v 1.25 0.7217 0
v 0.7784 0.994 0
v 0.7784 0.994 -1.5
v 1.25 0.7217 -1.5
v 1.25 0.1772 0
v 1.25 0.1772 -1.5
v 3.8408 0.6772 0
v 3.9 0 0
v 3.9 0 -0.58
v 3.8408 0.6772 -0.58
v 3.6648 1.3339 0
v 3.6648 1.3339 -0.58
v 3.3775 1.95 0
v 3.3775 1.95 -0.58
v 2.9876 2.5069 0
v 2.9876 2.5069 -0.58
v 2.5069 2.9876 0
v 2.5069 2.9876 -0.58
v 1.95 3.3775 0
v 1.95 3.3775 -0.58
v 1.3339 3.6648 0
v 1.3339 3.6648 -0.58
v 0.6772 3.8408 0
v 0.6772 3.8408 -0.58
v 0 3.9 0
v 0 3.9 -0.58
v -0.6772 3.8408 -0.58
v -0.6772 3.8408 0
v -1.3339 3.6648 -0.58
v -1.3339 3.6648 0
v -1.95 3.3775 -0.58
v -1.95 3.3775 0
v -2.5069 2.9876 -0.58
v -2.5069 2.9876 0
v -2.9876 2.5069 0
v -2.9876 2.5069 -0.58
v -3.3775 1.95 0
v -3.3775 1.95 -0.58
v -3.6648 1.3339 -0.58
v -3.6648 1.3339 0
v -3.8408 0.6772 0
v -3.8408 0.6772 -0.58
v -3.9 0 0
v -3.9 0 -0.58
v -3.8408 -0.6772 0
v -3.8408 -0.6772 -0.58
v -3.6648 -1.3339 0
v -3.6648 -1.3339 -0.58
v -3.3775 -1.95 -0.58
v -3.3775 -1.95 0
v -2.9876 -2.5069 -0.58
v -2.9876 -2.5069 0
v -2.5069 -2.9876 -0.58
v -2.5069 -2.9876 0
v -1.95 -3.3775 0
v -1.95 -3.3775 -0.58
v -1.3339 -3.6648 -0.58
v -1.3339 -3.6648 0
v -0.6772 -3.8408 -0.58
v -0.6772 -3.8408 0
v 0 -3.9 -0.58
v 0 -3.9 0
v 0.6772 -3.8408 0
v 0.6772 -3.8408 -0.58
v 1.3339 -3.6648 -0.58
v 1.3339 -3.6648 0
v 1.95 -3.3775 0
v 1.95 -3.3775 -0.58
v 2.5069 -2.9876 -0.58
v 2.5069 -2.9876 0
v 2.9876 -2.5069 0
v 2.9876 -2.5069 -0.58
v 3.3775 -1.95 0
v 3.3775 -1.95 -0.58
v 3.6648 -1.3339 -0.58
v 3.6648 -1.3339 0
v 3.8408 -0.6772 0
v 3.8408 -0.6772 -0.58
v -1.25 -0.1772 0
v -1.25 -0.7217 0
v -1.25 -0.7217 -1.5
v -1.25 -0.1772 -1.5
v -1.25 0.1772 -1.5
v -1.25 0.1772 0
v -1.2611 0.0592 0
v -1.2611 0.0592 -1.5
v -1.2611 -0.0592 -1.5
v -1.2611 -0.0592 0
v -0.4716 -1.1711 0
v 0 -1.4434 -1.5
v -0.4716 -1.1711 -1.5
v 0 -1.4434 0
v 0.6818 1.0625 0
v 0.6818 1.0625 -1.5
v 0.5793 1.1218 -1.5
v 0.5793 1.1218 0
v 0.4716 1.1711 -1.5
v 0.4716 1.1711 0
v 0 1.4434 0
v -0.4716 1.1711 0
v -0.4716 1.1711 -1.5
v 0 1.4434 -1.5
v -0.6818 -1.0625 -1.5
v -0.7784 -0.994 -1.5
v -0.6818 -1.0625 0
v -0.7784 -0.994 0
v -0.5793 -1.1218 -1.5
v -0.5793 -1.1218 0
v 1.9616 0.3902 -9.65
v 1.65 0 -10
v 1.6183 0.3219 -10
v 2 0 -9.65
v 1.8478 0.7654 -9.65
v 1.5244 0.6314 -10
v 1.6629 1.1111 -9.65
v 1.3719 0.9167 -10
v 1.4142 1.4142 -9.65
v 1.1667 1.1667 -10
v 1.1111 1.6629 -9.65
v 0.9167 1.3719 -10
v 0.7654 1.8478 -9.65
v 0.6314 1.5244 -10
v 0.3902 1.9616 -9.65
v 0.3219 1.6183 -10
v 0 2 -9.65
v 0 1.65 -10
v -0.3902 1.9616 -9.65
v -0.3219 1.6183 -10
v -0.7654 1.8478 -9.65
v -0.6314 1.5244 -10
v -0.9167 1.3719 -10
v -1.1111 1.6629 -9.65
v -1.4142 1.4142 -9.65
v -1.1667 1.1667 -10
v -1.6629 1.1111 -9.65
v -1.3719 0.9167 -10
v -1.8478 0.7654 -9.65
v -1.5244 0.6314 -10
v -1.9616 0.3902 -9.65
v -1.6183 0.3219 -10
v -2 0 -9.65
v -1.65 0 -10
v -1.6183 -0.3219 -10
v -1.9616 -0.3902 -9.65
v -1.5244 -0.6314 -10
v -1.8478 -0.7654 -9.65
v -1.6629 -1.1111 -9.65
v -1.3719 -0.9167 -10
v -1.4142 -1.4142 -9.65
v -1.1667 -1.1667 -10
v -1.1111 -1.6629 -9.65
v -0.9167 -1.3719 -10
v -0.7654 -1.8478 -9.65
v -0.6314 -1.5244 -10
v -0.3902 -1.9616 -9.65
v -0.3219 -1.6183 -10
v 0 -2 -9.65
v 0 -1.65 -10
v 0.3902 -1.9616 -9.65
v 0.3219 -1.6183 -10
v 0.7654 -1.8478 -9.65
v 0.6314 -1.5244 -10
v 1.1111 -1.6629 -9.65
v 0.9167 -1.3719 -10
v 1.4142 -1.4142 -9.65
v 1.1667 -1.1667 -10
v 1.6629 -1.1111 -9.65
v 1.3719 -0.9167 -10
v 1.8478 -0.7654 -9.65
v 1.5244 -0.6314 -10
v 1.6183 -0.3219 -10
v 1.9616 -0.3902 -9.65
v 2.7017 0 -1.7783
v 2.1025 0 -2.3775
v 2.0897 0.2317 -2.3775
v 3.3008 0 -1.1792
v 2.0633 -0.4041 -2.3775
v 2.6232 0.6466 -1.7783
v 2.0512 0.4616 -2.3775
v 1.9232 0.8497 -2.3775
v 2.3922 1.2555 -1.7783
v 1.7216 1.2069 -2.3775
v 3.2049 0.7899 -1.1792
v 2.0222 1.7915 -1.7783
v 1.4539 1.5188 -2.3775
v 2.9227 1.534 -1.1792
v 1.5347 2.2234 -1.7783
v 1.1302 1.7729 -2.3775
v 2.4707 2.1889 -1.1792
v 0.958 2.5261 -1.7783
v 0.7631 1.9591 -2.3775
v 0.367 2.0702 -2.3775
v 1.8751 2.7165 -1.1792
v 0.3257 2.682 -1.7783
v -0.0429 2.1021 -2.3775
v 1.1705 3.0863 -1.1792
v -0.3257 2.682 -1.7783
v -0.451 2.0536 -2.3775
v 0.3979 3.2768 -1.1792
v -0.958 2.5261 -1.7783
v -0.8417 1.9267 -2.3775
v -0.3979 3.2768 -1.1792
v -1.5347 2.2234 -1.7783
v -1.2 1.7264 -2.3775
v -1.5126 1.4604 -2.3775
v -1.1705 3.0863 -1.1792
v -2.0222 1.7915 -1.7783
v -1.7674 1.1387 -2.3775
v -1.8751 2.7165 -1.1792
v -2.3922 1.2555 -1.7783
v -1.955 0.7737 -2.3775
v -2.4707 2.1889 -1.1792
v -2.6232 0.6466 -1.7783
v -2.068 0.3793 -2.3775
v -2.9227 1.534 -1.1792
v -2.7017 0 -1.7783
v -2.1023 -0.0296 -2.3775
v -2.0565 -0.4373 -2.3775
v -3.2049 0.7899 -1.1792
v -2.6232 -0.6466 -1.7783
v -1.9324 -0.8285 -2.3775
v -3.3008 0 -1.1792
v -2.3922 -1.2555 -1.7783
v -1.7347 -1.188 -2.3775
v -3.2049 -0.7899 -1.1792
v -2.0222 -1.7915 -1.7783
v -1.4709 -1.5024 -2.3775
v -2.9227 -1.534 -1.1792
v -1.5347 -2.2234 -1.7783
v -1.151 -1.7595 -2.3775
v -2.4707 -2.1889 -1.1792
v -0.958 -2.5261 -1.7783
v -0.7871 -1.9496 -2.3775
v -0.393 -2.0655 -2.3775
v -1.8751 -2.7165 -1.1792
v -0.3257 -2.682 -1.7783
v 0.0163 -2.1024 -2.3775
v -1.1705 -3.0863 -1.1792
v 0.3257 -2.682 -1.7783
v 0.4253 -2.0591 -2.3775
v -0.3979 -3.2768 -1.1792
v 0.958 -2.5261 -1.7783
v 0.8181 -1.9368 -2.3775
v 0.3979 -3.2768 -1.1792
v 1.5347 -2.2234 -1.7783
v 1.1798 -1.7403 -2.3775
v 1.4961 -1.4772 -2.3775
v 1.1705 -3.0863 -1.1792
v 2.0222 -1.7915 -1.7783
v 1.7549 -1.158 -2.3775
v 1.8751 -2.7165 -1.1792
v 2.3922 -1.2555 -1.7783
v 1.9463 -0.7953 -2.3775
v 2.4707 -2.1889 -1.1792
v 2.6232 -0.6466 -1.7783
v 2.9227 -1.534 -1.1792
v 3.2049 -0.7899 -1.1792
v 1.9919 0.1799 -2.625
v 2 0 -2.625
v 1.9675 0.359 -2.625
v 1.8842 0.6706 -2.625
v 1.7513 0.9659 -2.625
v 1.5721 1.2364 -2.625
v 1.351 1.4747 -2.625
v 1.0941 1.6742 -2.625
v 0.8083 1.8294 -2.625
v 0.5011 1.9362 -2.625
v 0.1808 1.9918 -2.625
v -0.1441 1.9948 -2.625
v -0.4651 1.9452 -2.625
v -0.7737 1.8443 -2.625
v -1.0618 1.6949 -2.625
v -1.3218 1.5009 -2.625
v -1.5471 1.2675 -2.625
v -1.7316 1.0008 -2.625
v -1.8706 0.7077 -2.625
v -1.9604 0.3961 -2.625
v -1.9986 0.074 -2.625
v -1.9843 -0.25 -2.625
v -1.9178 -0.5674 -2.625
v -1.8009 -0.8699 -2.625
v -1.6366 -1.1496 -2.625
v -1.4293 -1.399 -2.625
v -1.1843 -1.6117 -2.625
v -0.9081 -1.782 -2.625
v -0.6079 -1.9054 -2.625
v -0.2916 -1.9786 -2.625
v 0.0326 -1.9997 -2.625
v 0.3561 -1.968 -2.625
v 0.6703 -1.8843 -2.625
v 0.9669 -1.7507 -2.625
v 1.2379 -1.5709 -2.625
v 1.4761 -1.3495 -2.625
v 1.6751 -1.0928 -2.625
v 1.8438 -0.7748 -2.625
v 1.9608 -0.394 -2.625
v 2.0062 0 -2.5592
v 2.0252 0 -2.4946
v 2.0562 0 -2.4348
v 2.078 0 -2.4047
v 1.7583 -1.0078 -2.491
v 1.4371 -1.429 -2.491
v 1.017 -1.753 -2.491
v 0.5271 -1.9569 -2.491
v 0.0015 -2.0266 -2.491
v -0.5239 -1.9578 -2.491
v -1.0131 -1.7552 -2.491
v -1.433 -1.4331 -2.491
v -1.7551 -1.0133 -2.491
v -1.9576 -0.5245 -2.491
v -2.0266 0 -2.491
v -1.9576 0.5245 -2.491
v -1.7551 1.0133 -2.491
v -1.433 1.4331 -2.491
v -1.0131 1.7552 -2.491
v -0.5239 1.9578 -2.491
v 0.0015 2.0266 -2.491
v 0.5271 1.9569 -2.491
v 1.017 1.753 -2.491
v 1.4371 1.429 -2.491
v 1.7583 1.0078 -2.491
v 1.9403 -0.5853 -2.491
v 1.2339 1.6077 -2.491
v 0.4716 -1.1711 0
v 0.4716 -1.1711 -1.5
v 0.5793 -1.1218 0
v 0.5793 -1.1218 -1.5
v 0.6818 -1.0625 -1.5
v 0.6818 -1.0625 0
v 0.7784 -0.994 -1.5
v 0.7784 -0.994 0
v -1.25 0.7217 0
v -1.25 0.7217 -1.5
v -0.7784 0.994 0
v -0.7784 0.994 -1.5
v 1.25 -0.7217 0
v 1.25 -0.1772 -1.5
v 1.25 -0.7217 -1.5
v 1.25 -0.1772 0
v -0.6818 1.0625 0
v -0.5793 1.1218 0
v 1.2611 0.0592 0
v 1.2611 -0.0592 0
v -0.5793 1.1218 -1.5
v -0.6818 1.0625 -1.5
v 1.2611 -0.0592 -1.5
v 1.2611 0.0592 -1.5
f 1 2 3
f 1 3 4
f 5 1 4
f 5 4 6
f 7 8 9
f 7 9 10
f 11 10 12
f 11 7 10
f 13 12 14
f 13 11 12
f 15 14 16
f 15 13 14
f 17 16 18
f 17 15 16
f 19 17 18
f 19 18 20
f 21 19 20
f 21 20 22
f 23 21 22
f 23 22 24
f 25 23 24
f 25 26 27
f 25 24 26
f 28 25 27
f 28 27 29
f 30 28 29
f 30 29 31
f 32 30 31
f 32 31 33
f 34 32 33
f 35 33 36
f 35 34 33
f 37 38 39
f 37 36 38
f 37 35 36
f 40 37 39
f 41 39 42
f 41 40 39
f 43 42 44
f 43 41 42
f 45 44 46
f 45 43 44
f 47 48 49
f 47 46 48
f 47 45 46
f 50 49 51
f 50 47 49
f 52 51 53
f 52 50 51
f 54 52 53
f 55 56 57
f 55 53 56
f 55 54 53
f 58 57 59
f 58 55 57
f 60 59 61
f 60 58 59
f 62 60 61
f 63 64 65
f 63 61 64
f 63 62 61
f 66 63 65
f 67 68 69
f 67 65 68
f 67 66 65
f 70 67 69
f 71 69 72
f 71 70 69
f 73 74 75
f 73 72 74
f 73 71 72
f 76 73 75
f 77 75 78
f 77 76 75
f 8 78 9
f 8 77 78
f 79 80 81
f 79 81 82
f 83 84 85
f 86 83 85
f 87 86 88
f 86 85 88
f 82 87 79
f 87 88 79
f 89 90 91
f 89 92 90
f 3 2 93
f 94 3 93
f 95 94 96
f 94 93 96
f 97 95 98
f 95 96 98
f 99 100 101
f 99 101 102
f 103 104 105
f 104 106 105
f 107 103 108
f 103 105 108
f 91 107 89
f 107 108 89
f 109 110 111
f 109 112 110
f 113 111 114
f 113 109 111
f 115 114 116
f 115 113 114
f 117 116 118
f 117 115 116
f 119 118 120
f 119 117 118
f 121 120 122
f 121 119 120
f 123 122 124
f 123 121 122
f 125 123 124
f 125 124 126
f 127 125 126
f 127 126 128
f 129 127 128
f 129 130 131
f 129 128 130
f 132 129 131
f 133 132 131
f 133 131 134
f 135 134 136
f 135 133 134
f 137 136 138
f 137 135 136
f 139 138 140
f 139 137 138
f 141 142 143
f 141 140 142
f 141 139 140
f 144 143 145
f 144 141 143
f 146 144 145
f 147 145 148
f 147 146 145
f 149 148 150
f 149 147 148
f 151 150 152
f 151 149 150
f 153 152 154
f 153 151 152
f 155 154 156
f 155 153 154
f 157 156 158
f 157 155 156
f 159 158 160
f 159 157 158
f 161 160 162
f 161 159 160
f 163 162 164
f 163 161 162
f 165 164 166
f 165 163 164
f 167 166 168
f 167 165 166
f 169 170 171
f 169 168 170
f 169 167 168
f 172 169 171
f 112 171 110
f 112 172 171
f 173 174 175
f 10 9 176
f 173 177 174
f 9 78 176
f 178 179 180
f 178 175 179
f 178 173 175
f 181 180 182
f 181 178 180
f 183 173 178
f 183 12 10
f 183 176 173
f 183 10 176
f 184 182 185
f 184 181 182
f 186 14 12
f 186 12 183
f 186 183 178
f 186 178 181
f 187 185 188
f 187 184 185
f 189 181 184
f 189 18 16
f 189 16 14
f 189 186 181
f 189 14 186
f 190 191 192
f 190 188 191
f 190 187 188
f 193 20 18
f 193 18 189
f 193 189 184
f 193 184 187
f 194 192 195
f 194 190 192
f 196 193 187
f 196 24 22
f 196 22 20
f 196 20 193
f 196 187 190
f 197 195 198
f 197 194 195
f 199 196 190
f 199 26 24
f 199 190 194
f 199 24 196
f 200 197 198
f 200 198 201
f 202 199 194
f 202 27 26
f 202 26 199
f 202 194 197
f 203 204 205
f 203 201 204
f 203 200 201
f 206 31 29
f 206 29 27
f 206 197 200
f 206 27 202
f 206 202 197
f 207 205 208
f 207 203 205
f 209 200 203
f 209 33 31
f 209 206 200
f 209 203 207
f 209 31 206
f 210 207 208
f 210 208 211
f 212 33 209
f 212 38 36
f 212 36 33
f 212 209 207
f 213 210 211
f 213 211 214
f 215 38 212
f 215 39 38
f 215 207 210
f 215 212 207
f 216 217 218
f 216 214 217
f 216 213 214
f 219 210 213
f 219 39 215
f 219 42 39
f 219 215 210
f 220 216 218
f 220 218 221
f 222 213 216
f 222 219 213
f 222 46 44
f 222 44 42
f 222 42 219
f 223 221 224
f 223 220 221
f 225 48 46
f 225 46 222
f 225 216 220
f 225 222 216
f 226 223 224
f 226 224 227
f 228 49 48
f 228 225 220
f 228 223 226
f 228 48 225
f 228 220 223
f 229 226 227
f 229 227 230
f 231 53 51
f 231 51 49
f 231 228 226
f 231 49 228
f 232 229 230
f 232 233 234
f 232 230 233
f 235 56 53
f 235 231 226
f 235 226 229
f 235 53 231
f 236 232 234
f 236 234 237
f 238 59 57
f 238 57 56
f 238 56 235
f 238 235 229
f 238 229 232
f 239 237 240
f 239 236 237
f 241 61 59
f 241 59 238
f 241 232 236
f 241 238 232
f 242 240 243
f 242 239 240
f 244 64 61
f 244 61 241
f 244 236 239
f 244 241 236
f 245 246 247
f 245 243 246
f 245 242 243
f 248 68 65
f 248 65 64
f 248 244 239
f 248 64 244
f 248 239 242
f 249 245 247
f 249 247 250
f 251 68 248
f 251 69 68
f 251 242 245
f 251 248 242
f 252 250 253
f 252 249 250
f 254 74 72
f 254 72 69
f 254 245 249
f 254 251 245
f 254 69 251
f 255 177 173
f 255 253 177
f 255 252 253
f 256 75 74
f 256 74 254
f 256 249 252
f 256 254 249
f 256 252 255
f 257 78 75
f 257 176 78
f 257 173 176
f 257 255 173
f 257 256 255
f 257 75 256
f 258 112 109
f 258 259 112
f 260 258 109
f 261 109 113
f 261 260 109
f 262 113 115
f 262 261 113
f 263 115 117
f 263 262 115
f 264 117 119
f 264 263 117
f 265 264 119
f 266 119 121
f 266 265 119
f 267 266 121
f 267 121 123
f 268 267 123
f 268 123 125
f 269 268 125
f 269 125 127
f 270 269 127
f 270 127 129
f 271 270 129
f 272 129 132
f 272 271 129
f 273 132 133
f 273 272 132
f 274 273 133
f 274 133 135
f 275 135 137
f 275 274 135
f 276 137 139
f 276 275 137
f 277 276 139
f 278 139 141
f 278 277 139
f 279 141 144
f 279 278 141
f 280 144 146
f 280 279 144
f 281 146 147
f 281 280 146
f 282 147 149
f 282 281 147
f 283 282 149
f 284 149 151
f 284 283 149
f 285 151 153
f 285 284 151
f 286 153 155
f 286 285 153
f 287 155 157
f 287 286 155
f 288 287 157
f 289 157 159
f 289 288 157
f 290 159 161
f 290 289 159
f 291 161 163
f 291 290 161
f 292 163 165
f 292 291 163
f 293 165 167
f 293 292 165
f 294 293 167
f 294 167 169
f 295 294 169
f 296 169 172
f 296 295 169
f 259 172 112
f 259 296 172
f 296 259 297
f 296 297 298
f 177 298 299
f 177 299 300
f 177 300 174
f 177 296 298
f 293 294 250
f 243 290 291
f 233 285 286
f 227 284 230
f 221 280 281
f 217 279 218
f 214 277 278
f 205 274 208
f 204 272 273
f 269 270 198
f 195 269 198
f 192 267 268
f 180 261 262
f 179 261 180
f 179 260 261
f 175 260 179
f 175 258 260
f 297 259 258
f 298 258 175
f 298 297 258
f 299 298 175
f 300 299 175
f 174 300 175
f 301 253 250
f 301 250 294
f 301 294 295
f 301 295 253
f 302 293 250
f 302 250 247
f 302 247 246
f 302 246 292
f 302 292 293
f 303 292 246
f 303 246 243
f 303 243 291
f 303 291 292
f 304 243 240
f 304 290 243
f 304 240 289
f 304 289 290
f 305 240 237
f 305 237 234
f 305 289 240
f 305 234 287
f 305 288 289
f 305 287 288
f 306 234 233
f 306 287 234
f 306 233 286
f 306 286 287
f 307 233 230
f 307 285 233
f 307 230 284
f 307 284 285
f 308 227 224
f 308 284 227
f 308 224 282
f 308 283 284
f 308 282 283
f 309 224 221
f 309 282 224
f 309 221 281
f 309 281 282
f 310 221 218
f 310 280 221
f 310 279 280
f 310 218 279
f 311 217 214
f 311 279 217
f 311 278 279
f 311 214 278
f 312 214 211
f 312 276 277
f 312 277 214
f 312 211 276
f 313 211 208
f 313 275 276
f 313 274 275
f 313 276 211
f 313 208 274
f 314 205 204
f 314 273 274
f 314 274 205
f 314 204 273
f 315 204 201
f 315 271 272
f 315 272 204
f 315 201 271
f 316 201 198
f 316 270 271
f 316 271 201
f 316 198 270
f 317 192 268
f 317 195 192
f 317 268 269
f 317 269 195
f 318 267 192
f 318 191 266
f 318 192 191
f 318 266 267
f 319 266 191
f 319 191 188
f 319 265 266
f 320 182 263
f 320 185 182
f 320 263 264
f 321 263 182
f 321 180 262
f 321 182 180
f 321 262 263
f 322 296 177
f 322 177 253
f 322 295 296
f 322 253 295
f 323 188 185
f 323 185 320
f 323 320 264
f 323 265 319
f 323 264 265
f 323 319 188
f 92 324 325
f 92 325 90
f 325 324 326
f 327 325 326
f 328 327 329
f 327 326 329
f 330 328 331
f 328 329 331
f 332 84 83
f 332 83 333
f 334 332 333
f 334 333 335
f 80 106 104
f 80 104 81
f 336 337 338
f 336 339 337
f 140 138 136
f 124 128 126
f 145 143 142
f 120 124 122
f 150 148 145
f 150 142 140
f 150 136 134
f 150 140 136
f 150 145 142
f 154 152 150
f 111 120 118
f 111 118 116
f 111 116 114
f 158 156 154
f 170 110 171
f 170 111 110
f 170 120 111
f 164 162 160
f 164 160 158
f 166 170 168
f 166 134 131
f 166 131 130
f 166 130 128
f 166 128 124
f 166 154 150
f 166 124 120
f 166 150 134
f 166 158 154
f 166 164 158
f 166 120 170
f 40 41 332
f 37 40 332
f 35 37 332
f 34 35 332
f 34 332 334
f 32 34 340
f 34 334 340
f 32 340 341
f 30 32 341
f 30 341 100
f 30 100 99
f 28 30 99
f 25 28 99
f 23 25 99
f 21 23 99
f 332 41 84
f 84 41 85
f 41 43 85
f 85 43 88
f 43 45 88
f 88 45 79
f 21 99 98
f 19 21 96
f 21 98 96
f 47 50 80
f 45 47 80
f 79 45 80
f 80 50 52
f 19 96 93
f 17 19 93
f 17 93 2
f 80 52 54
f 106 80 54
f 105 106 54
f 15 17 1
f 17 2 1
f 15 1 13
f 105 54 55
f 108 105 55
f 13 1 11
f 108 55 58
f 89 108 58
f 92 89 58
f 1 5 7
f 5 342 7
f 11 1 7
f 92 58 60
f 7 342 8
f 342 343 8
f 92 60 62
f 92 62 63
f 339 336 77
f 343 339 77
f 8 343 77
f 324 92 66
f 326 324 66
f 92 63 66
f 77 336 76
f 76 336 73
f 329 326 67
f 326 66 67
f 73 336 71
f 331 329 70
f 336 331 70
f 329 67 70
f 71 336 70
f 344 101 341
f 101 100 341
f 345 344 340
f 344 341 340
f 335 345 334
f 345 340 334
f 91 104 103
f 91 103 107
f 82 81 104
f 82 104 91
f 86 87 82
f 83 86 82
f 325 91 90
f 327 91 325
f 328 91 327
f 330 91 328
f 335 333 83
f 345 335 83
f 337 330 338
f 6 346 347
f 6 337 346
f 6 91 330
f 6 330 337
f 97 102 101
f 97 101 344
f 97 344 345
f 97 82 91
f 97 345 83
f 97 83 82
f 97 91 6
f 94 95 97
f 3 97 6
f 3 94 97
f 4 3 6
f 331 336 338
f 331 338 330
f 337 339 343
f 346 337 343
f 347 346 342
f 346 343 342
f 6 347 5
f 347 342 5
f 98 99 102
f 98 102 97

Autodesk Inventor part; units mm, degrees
ref_plane "YZ Plane" through (0, 0, 0) normal (1, 0, 0) x (0, 1, 0)
sketch "Esquisse2" plane through (0, 0, 0) normal (0, 1, 0) x (-1, 0, 0)
  line L0 (0, -10) -> (-2, -10)
  line L1 (0, 0) -> (0, -10)
  line L2 (-3.9, 0) -> (0, 0)
  line L3 (-3.9, -0.58) -> (-3.9, 0)
  line L4 (-2, -2.48) -> (-3.9, -0.58)
  line L5 (-2, -10) -> (-2, -2.48)
  line L6 (0, 0) -> (0, -10)
  dimension "d2" = 45
  dimension "d4" = 2
  dimension "d6" = 3.9
  dimension "d8" = 2.48
  dimension "d10" = 10
revolve "Révolution1" add sketch "Esquisse2" angle 360 about axis through (0, 0, 0) along (0, 0, -1)
fillet "Congé1" radius 0.35 1 edges at (-2, 0, -2.48)
chamfer "Chanfrein1" distance 0.35 angle 45 1 edges at (-2, 0, -10)
sketch "Esquisse4" plane through (0, 0, 0) normal (0, 0, 1) x (1, 0, 0)
  circle A0 centre (0, 0) radius 3.9 projected
  circle A1 centre (0, 0) radius 1.25 construction
  line L0 (-1.25, -0.7217) -> (-1.25, 0.7217)
  line L1 (-1.25, 0.7217) -> (0, 1.4434)
  line L2 (0, 1.4434) -> (1.25, 0.7217)
  line L3 (1.25, 0.7217) -> (1.25, -0.7217)
  line L4 (1.25, -0.7217) -> (0, -1.4434)
  line L5 (0, -1.4434) -> (-1.25, -0.7217)
  dimension "d27" = 2.5
extrude "Extrusion1" cut sketch "Esquisse4" against normal blind 1.5 contours L0 L1 L2 L3 L4 L5
sketch "Esquisse5" plane through (0, 0, 0) normal (0, 0, 1) x (1, 0, 0)
  circle A0 centre (0, 0) radius 3.9 projected
  circle A1 centre (0, 0) radius 1.2625
  dimension "d38" = 2.525
extrude "Extrusion2" cut sketch "Esquisse5" against normal blind 1.5 contours A1
thread "Filetage1" size "M4x0.7" class "4g6g" standard "ANSI Metric M Profile" length 6.12
ref_plane "MSC_PF1" through (0, 0, 0) normal (1, 0, 0) x (0, 1, 0)
ref_plane "MSC_PT1" through (3.9, 0, -0.58) normal (0, 0, -1) x (-1, 0, 0)
equation "\"d4\" = 0.5 * NND"
equation "\"d6\" = 0.5 * ParA"
equation "\"d8\" = ParH"
equation "\"d10\" = NLG"
equation "\"d27\" = ParJ"
equation "\"d39\" = Tt"
equation "\"d24\" = Rr"
equation "\"d25\" = 0.5 * PTC"
equation "\"d26\" = 0.5 * PTC"
equation "\"d28\" = Tt"
equation "\"d31\" = Lt"
equation "\"d38\" = 1.01 * ParJ"
equation "\"NND\" = 4"
equation "\"NLG\" = 10"
equation "\"PTC\" = 0.7"
equation "\"ParA\" = 7.8"
equation "\"ParH\" = 2.48"
equation "\"ParJ\" = 2.5"
equation "\"Tt\" = 1.5"
equation "\"Rr\" = 0.35"
equation "\"msp_e\" = 0.288675 * ParJ"
equation "\"Lt\" = 6.12"
equation "\"THREADDIA\" = NND"
properties part number "ASME/ANSI B18.3.5M - M4x10(2)" material "Acier, doux"
